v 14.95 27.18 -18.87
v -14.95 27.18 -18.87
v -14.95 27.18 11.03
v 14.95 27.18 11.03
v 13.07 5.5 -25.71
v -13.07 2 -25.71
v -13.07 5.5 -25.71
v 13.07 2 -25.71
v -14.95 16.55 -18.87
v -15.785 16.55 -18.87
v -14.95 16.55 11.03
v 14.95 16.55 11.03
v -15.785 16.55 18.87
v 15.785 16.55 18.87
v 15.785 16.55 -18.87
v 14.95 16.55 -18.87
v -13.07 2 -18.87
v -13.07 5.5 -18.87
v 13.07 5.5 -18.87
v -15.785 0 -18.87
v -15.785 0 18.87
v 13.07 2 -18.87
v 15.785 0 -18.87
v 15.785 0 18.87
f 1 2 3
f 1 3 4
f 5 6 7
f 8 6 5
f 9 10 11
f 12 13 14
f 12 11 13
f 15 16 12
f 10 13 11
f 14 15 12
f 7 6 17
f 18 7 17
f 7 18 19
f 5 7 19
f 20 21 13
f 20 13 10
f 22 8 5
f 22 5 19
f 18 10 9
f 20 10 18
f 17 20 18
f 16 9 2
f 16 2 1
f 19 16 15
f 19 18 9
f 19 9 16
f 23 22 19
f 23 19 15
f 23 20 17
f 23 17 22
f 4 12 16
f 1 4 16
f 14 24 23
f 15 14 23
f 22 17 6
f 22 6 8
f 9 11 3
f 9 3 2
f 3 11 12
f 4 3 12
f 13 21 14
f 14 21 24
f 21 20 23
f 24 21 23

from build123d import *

# Parameters (mm, degrees)
SCHIZZO1_W                   = 31.57
SCHIZZO1_H                   = 37.74
ESTRUSIONE_ESTRUSIONE1_DEPTH = 16.55
SCHIZZO2_W                   = 29.9
SCHIZZO2_H                   = 29.9
ESTRUSIONE_ESTRUSIONE2_DEPTH = 10.63
ESTRUSIONE_ESTRUSIONE3_START = -2
SCHIZZO3_W                   = 26.14
SCHIZZO3_H                   = 6.84
ESTRUSIONE_ESTRUSIONE3_DEPTH = 3.5


with BuildPart() as part:
    # Schizzo1 → Estrusione-Estrusione1 (new body)
    with BuildSketch(Plane(origin=(0, 0, 0), x_dir=(1, 0, 0), z_dir=(0, 1, 0))):
        Rectangle(SCHIZZO1_W, SCHIZZO1_H)
    extrude(amount=ESTRUSIONE_ESTRUSIONE1_DEPTH)

    # Schizzo2 → Estrusione-Estrusione2 (add)
    with BuildSketch(Plane(origin=(0, 16.55, 0), x_dir=(1, 0, 0), z_dir=(0, 1, 0))):
        with Locations((0, 3.92)):
            Rectangle(SCHIZZO2_W, SCHIZZO2_H)
    extrude(amount=ESTRUSIONE_ESTRUSIONE2_DEPTH)

    # Schizzo3 → Estrusione-Estrusione3 (add)
    with BuildSketch(Plane.XZ.offset(ESTRUSIONE_ESTRUSIONE3_START)):
        with Locations((0, -22.29)):
            Rectangle(SCHIZZO3_W, SCHIZZO3_H)
    extrude(amount=-ESTRUSIONE_ESTRUSIONE3_DEPTH)


solid = part.part
